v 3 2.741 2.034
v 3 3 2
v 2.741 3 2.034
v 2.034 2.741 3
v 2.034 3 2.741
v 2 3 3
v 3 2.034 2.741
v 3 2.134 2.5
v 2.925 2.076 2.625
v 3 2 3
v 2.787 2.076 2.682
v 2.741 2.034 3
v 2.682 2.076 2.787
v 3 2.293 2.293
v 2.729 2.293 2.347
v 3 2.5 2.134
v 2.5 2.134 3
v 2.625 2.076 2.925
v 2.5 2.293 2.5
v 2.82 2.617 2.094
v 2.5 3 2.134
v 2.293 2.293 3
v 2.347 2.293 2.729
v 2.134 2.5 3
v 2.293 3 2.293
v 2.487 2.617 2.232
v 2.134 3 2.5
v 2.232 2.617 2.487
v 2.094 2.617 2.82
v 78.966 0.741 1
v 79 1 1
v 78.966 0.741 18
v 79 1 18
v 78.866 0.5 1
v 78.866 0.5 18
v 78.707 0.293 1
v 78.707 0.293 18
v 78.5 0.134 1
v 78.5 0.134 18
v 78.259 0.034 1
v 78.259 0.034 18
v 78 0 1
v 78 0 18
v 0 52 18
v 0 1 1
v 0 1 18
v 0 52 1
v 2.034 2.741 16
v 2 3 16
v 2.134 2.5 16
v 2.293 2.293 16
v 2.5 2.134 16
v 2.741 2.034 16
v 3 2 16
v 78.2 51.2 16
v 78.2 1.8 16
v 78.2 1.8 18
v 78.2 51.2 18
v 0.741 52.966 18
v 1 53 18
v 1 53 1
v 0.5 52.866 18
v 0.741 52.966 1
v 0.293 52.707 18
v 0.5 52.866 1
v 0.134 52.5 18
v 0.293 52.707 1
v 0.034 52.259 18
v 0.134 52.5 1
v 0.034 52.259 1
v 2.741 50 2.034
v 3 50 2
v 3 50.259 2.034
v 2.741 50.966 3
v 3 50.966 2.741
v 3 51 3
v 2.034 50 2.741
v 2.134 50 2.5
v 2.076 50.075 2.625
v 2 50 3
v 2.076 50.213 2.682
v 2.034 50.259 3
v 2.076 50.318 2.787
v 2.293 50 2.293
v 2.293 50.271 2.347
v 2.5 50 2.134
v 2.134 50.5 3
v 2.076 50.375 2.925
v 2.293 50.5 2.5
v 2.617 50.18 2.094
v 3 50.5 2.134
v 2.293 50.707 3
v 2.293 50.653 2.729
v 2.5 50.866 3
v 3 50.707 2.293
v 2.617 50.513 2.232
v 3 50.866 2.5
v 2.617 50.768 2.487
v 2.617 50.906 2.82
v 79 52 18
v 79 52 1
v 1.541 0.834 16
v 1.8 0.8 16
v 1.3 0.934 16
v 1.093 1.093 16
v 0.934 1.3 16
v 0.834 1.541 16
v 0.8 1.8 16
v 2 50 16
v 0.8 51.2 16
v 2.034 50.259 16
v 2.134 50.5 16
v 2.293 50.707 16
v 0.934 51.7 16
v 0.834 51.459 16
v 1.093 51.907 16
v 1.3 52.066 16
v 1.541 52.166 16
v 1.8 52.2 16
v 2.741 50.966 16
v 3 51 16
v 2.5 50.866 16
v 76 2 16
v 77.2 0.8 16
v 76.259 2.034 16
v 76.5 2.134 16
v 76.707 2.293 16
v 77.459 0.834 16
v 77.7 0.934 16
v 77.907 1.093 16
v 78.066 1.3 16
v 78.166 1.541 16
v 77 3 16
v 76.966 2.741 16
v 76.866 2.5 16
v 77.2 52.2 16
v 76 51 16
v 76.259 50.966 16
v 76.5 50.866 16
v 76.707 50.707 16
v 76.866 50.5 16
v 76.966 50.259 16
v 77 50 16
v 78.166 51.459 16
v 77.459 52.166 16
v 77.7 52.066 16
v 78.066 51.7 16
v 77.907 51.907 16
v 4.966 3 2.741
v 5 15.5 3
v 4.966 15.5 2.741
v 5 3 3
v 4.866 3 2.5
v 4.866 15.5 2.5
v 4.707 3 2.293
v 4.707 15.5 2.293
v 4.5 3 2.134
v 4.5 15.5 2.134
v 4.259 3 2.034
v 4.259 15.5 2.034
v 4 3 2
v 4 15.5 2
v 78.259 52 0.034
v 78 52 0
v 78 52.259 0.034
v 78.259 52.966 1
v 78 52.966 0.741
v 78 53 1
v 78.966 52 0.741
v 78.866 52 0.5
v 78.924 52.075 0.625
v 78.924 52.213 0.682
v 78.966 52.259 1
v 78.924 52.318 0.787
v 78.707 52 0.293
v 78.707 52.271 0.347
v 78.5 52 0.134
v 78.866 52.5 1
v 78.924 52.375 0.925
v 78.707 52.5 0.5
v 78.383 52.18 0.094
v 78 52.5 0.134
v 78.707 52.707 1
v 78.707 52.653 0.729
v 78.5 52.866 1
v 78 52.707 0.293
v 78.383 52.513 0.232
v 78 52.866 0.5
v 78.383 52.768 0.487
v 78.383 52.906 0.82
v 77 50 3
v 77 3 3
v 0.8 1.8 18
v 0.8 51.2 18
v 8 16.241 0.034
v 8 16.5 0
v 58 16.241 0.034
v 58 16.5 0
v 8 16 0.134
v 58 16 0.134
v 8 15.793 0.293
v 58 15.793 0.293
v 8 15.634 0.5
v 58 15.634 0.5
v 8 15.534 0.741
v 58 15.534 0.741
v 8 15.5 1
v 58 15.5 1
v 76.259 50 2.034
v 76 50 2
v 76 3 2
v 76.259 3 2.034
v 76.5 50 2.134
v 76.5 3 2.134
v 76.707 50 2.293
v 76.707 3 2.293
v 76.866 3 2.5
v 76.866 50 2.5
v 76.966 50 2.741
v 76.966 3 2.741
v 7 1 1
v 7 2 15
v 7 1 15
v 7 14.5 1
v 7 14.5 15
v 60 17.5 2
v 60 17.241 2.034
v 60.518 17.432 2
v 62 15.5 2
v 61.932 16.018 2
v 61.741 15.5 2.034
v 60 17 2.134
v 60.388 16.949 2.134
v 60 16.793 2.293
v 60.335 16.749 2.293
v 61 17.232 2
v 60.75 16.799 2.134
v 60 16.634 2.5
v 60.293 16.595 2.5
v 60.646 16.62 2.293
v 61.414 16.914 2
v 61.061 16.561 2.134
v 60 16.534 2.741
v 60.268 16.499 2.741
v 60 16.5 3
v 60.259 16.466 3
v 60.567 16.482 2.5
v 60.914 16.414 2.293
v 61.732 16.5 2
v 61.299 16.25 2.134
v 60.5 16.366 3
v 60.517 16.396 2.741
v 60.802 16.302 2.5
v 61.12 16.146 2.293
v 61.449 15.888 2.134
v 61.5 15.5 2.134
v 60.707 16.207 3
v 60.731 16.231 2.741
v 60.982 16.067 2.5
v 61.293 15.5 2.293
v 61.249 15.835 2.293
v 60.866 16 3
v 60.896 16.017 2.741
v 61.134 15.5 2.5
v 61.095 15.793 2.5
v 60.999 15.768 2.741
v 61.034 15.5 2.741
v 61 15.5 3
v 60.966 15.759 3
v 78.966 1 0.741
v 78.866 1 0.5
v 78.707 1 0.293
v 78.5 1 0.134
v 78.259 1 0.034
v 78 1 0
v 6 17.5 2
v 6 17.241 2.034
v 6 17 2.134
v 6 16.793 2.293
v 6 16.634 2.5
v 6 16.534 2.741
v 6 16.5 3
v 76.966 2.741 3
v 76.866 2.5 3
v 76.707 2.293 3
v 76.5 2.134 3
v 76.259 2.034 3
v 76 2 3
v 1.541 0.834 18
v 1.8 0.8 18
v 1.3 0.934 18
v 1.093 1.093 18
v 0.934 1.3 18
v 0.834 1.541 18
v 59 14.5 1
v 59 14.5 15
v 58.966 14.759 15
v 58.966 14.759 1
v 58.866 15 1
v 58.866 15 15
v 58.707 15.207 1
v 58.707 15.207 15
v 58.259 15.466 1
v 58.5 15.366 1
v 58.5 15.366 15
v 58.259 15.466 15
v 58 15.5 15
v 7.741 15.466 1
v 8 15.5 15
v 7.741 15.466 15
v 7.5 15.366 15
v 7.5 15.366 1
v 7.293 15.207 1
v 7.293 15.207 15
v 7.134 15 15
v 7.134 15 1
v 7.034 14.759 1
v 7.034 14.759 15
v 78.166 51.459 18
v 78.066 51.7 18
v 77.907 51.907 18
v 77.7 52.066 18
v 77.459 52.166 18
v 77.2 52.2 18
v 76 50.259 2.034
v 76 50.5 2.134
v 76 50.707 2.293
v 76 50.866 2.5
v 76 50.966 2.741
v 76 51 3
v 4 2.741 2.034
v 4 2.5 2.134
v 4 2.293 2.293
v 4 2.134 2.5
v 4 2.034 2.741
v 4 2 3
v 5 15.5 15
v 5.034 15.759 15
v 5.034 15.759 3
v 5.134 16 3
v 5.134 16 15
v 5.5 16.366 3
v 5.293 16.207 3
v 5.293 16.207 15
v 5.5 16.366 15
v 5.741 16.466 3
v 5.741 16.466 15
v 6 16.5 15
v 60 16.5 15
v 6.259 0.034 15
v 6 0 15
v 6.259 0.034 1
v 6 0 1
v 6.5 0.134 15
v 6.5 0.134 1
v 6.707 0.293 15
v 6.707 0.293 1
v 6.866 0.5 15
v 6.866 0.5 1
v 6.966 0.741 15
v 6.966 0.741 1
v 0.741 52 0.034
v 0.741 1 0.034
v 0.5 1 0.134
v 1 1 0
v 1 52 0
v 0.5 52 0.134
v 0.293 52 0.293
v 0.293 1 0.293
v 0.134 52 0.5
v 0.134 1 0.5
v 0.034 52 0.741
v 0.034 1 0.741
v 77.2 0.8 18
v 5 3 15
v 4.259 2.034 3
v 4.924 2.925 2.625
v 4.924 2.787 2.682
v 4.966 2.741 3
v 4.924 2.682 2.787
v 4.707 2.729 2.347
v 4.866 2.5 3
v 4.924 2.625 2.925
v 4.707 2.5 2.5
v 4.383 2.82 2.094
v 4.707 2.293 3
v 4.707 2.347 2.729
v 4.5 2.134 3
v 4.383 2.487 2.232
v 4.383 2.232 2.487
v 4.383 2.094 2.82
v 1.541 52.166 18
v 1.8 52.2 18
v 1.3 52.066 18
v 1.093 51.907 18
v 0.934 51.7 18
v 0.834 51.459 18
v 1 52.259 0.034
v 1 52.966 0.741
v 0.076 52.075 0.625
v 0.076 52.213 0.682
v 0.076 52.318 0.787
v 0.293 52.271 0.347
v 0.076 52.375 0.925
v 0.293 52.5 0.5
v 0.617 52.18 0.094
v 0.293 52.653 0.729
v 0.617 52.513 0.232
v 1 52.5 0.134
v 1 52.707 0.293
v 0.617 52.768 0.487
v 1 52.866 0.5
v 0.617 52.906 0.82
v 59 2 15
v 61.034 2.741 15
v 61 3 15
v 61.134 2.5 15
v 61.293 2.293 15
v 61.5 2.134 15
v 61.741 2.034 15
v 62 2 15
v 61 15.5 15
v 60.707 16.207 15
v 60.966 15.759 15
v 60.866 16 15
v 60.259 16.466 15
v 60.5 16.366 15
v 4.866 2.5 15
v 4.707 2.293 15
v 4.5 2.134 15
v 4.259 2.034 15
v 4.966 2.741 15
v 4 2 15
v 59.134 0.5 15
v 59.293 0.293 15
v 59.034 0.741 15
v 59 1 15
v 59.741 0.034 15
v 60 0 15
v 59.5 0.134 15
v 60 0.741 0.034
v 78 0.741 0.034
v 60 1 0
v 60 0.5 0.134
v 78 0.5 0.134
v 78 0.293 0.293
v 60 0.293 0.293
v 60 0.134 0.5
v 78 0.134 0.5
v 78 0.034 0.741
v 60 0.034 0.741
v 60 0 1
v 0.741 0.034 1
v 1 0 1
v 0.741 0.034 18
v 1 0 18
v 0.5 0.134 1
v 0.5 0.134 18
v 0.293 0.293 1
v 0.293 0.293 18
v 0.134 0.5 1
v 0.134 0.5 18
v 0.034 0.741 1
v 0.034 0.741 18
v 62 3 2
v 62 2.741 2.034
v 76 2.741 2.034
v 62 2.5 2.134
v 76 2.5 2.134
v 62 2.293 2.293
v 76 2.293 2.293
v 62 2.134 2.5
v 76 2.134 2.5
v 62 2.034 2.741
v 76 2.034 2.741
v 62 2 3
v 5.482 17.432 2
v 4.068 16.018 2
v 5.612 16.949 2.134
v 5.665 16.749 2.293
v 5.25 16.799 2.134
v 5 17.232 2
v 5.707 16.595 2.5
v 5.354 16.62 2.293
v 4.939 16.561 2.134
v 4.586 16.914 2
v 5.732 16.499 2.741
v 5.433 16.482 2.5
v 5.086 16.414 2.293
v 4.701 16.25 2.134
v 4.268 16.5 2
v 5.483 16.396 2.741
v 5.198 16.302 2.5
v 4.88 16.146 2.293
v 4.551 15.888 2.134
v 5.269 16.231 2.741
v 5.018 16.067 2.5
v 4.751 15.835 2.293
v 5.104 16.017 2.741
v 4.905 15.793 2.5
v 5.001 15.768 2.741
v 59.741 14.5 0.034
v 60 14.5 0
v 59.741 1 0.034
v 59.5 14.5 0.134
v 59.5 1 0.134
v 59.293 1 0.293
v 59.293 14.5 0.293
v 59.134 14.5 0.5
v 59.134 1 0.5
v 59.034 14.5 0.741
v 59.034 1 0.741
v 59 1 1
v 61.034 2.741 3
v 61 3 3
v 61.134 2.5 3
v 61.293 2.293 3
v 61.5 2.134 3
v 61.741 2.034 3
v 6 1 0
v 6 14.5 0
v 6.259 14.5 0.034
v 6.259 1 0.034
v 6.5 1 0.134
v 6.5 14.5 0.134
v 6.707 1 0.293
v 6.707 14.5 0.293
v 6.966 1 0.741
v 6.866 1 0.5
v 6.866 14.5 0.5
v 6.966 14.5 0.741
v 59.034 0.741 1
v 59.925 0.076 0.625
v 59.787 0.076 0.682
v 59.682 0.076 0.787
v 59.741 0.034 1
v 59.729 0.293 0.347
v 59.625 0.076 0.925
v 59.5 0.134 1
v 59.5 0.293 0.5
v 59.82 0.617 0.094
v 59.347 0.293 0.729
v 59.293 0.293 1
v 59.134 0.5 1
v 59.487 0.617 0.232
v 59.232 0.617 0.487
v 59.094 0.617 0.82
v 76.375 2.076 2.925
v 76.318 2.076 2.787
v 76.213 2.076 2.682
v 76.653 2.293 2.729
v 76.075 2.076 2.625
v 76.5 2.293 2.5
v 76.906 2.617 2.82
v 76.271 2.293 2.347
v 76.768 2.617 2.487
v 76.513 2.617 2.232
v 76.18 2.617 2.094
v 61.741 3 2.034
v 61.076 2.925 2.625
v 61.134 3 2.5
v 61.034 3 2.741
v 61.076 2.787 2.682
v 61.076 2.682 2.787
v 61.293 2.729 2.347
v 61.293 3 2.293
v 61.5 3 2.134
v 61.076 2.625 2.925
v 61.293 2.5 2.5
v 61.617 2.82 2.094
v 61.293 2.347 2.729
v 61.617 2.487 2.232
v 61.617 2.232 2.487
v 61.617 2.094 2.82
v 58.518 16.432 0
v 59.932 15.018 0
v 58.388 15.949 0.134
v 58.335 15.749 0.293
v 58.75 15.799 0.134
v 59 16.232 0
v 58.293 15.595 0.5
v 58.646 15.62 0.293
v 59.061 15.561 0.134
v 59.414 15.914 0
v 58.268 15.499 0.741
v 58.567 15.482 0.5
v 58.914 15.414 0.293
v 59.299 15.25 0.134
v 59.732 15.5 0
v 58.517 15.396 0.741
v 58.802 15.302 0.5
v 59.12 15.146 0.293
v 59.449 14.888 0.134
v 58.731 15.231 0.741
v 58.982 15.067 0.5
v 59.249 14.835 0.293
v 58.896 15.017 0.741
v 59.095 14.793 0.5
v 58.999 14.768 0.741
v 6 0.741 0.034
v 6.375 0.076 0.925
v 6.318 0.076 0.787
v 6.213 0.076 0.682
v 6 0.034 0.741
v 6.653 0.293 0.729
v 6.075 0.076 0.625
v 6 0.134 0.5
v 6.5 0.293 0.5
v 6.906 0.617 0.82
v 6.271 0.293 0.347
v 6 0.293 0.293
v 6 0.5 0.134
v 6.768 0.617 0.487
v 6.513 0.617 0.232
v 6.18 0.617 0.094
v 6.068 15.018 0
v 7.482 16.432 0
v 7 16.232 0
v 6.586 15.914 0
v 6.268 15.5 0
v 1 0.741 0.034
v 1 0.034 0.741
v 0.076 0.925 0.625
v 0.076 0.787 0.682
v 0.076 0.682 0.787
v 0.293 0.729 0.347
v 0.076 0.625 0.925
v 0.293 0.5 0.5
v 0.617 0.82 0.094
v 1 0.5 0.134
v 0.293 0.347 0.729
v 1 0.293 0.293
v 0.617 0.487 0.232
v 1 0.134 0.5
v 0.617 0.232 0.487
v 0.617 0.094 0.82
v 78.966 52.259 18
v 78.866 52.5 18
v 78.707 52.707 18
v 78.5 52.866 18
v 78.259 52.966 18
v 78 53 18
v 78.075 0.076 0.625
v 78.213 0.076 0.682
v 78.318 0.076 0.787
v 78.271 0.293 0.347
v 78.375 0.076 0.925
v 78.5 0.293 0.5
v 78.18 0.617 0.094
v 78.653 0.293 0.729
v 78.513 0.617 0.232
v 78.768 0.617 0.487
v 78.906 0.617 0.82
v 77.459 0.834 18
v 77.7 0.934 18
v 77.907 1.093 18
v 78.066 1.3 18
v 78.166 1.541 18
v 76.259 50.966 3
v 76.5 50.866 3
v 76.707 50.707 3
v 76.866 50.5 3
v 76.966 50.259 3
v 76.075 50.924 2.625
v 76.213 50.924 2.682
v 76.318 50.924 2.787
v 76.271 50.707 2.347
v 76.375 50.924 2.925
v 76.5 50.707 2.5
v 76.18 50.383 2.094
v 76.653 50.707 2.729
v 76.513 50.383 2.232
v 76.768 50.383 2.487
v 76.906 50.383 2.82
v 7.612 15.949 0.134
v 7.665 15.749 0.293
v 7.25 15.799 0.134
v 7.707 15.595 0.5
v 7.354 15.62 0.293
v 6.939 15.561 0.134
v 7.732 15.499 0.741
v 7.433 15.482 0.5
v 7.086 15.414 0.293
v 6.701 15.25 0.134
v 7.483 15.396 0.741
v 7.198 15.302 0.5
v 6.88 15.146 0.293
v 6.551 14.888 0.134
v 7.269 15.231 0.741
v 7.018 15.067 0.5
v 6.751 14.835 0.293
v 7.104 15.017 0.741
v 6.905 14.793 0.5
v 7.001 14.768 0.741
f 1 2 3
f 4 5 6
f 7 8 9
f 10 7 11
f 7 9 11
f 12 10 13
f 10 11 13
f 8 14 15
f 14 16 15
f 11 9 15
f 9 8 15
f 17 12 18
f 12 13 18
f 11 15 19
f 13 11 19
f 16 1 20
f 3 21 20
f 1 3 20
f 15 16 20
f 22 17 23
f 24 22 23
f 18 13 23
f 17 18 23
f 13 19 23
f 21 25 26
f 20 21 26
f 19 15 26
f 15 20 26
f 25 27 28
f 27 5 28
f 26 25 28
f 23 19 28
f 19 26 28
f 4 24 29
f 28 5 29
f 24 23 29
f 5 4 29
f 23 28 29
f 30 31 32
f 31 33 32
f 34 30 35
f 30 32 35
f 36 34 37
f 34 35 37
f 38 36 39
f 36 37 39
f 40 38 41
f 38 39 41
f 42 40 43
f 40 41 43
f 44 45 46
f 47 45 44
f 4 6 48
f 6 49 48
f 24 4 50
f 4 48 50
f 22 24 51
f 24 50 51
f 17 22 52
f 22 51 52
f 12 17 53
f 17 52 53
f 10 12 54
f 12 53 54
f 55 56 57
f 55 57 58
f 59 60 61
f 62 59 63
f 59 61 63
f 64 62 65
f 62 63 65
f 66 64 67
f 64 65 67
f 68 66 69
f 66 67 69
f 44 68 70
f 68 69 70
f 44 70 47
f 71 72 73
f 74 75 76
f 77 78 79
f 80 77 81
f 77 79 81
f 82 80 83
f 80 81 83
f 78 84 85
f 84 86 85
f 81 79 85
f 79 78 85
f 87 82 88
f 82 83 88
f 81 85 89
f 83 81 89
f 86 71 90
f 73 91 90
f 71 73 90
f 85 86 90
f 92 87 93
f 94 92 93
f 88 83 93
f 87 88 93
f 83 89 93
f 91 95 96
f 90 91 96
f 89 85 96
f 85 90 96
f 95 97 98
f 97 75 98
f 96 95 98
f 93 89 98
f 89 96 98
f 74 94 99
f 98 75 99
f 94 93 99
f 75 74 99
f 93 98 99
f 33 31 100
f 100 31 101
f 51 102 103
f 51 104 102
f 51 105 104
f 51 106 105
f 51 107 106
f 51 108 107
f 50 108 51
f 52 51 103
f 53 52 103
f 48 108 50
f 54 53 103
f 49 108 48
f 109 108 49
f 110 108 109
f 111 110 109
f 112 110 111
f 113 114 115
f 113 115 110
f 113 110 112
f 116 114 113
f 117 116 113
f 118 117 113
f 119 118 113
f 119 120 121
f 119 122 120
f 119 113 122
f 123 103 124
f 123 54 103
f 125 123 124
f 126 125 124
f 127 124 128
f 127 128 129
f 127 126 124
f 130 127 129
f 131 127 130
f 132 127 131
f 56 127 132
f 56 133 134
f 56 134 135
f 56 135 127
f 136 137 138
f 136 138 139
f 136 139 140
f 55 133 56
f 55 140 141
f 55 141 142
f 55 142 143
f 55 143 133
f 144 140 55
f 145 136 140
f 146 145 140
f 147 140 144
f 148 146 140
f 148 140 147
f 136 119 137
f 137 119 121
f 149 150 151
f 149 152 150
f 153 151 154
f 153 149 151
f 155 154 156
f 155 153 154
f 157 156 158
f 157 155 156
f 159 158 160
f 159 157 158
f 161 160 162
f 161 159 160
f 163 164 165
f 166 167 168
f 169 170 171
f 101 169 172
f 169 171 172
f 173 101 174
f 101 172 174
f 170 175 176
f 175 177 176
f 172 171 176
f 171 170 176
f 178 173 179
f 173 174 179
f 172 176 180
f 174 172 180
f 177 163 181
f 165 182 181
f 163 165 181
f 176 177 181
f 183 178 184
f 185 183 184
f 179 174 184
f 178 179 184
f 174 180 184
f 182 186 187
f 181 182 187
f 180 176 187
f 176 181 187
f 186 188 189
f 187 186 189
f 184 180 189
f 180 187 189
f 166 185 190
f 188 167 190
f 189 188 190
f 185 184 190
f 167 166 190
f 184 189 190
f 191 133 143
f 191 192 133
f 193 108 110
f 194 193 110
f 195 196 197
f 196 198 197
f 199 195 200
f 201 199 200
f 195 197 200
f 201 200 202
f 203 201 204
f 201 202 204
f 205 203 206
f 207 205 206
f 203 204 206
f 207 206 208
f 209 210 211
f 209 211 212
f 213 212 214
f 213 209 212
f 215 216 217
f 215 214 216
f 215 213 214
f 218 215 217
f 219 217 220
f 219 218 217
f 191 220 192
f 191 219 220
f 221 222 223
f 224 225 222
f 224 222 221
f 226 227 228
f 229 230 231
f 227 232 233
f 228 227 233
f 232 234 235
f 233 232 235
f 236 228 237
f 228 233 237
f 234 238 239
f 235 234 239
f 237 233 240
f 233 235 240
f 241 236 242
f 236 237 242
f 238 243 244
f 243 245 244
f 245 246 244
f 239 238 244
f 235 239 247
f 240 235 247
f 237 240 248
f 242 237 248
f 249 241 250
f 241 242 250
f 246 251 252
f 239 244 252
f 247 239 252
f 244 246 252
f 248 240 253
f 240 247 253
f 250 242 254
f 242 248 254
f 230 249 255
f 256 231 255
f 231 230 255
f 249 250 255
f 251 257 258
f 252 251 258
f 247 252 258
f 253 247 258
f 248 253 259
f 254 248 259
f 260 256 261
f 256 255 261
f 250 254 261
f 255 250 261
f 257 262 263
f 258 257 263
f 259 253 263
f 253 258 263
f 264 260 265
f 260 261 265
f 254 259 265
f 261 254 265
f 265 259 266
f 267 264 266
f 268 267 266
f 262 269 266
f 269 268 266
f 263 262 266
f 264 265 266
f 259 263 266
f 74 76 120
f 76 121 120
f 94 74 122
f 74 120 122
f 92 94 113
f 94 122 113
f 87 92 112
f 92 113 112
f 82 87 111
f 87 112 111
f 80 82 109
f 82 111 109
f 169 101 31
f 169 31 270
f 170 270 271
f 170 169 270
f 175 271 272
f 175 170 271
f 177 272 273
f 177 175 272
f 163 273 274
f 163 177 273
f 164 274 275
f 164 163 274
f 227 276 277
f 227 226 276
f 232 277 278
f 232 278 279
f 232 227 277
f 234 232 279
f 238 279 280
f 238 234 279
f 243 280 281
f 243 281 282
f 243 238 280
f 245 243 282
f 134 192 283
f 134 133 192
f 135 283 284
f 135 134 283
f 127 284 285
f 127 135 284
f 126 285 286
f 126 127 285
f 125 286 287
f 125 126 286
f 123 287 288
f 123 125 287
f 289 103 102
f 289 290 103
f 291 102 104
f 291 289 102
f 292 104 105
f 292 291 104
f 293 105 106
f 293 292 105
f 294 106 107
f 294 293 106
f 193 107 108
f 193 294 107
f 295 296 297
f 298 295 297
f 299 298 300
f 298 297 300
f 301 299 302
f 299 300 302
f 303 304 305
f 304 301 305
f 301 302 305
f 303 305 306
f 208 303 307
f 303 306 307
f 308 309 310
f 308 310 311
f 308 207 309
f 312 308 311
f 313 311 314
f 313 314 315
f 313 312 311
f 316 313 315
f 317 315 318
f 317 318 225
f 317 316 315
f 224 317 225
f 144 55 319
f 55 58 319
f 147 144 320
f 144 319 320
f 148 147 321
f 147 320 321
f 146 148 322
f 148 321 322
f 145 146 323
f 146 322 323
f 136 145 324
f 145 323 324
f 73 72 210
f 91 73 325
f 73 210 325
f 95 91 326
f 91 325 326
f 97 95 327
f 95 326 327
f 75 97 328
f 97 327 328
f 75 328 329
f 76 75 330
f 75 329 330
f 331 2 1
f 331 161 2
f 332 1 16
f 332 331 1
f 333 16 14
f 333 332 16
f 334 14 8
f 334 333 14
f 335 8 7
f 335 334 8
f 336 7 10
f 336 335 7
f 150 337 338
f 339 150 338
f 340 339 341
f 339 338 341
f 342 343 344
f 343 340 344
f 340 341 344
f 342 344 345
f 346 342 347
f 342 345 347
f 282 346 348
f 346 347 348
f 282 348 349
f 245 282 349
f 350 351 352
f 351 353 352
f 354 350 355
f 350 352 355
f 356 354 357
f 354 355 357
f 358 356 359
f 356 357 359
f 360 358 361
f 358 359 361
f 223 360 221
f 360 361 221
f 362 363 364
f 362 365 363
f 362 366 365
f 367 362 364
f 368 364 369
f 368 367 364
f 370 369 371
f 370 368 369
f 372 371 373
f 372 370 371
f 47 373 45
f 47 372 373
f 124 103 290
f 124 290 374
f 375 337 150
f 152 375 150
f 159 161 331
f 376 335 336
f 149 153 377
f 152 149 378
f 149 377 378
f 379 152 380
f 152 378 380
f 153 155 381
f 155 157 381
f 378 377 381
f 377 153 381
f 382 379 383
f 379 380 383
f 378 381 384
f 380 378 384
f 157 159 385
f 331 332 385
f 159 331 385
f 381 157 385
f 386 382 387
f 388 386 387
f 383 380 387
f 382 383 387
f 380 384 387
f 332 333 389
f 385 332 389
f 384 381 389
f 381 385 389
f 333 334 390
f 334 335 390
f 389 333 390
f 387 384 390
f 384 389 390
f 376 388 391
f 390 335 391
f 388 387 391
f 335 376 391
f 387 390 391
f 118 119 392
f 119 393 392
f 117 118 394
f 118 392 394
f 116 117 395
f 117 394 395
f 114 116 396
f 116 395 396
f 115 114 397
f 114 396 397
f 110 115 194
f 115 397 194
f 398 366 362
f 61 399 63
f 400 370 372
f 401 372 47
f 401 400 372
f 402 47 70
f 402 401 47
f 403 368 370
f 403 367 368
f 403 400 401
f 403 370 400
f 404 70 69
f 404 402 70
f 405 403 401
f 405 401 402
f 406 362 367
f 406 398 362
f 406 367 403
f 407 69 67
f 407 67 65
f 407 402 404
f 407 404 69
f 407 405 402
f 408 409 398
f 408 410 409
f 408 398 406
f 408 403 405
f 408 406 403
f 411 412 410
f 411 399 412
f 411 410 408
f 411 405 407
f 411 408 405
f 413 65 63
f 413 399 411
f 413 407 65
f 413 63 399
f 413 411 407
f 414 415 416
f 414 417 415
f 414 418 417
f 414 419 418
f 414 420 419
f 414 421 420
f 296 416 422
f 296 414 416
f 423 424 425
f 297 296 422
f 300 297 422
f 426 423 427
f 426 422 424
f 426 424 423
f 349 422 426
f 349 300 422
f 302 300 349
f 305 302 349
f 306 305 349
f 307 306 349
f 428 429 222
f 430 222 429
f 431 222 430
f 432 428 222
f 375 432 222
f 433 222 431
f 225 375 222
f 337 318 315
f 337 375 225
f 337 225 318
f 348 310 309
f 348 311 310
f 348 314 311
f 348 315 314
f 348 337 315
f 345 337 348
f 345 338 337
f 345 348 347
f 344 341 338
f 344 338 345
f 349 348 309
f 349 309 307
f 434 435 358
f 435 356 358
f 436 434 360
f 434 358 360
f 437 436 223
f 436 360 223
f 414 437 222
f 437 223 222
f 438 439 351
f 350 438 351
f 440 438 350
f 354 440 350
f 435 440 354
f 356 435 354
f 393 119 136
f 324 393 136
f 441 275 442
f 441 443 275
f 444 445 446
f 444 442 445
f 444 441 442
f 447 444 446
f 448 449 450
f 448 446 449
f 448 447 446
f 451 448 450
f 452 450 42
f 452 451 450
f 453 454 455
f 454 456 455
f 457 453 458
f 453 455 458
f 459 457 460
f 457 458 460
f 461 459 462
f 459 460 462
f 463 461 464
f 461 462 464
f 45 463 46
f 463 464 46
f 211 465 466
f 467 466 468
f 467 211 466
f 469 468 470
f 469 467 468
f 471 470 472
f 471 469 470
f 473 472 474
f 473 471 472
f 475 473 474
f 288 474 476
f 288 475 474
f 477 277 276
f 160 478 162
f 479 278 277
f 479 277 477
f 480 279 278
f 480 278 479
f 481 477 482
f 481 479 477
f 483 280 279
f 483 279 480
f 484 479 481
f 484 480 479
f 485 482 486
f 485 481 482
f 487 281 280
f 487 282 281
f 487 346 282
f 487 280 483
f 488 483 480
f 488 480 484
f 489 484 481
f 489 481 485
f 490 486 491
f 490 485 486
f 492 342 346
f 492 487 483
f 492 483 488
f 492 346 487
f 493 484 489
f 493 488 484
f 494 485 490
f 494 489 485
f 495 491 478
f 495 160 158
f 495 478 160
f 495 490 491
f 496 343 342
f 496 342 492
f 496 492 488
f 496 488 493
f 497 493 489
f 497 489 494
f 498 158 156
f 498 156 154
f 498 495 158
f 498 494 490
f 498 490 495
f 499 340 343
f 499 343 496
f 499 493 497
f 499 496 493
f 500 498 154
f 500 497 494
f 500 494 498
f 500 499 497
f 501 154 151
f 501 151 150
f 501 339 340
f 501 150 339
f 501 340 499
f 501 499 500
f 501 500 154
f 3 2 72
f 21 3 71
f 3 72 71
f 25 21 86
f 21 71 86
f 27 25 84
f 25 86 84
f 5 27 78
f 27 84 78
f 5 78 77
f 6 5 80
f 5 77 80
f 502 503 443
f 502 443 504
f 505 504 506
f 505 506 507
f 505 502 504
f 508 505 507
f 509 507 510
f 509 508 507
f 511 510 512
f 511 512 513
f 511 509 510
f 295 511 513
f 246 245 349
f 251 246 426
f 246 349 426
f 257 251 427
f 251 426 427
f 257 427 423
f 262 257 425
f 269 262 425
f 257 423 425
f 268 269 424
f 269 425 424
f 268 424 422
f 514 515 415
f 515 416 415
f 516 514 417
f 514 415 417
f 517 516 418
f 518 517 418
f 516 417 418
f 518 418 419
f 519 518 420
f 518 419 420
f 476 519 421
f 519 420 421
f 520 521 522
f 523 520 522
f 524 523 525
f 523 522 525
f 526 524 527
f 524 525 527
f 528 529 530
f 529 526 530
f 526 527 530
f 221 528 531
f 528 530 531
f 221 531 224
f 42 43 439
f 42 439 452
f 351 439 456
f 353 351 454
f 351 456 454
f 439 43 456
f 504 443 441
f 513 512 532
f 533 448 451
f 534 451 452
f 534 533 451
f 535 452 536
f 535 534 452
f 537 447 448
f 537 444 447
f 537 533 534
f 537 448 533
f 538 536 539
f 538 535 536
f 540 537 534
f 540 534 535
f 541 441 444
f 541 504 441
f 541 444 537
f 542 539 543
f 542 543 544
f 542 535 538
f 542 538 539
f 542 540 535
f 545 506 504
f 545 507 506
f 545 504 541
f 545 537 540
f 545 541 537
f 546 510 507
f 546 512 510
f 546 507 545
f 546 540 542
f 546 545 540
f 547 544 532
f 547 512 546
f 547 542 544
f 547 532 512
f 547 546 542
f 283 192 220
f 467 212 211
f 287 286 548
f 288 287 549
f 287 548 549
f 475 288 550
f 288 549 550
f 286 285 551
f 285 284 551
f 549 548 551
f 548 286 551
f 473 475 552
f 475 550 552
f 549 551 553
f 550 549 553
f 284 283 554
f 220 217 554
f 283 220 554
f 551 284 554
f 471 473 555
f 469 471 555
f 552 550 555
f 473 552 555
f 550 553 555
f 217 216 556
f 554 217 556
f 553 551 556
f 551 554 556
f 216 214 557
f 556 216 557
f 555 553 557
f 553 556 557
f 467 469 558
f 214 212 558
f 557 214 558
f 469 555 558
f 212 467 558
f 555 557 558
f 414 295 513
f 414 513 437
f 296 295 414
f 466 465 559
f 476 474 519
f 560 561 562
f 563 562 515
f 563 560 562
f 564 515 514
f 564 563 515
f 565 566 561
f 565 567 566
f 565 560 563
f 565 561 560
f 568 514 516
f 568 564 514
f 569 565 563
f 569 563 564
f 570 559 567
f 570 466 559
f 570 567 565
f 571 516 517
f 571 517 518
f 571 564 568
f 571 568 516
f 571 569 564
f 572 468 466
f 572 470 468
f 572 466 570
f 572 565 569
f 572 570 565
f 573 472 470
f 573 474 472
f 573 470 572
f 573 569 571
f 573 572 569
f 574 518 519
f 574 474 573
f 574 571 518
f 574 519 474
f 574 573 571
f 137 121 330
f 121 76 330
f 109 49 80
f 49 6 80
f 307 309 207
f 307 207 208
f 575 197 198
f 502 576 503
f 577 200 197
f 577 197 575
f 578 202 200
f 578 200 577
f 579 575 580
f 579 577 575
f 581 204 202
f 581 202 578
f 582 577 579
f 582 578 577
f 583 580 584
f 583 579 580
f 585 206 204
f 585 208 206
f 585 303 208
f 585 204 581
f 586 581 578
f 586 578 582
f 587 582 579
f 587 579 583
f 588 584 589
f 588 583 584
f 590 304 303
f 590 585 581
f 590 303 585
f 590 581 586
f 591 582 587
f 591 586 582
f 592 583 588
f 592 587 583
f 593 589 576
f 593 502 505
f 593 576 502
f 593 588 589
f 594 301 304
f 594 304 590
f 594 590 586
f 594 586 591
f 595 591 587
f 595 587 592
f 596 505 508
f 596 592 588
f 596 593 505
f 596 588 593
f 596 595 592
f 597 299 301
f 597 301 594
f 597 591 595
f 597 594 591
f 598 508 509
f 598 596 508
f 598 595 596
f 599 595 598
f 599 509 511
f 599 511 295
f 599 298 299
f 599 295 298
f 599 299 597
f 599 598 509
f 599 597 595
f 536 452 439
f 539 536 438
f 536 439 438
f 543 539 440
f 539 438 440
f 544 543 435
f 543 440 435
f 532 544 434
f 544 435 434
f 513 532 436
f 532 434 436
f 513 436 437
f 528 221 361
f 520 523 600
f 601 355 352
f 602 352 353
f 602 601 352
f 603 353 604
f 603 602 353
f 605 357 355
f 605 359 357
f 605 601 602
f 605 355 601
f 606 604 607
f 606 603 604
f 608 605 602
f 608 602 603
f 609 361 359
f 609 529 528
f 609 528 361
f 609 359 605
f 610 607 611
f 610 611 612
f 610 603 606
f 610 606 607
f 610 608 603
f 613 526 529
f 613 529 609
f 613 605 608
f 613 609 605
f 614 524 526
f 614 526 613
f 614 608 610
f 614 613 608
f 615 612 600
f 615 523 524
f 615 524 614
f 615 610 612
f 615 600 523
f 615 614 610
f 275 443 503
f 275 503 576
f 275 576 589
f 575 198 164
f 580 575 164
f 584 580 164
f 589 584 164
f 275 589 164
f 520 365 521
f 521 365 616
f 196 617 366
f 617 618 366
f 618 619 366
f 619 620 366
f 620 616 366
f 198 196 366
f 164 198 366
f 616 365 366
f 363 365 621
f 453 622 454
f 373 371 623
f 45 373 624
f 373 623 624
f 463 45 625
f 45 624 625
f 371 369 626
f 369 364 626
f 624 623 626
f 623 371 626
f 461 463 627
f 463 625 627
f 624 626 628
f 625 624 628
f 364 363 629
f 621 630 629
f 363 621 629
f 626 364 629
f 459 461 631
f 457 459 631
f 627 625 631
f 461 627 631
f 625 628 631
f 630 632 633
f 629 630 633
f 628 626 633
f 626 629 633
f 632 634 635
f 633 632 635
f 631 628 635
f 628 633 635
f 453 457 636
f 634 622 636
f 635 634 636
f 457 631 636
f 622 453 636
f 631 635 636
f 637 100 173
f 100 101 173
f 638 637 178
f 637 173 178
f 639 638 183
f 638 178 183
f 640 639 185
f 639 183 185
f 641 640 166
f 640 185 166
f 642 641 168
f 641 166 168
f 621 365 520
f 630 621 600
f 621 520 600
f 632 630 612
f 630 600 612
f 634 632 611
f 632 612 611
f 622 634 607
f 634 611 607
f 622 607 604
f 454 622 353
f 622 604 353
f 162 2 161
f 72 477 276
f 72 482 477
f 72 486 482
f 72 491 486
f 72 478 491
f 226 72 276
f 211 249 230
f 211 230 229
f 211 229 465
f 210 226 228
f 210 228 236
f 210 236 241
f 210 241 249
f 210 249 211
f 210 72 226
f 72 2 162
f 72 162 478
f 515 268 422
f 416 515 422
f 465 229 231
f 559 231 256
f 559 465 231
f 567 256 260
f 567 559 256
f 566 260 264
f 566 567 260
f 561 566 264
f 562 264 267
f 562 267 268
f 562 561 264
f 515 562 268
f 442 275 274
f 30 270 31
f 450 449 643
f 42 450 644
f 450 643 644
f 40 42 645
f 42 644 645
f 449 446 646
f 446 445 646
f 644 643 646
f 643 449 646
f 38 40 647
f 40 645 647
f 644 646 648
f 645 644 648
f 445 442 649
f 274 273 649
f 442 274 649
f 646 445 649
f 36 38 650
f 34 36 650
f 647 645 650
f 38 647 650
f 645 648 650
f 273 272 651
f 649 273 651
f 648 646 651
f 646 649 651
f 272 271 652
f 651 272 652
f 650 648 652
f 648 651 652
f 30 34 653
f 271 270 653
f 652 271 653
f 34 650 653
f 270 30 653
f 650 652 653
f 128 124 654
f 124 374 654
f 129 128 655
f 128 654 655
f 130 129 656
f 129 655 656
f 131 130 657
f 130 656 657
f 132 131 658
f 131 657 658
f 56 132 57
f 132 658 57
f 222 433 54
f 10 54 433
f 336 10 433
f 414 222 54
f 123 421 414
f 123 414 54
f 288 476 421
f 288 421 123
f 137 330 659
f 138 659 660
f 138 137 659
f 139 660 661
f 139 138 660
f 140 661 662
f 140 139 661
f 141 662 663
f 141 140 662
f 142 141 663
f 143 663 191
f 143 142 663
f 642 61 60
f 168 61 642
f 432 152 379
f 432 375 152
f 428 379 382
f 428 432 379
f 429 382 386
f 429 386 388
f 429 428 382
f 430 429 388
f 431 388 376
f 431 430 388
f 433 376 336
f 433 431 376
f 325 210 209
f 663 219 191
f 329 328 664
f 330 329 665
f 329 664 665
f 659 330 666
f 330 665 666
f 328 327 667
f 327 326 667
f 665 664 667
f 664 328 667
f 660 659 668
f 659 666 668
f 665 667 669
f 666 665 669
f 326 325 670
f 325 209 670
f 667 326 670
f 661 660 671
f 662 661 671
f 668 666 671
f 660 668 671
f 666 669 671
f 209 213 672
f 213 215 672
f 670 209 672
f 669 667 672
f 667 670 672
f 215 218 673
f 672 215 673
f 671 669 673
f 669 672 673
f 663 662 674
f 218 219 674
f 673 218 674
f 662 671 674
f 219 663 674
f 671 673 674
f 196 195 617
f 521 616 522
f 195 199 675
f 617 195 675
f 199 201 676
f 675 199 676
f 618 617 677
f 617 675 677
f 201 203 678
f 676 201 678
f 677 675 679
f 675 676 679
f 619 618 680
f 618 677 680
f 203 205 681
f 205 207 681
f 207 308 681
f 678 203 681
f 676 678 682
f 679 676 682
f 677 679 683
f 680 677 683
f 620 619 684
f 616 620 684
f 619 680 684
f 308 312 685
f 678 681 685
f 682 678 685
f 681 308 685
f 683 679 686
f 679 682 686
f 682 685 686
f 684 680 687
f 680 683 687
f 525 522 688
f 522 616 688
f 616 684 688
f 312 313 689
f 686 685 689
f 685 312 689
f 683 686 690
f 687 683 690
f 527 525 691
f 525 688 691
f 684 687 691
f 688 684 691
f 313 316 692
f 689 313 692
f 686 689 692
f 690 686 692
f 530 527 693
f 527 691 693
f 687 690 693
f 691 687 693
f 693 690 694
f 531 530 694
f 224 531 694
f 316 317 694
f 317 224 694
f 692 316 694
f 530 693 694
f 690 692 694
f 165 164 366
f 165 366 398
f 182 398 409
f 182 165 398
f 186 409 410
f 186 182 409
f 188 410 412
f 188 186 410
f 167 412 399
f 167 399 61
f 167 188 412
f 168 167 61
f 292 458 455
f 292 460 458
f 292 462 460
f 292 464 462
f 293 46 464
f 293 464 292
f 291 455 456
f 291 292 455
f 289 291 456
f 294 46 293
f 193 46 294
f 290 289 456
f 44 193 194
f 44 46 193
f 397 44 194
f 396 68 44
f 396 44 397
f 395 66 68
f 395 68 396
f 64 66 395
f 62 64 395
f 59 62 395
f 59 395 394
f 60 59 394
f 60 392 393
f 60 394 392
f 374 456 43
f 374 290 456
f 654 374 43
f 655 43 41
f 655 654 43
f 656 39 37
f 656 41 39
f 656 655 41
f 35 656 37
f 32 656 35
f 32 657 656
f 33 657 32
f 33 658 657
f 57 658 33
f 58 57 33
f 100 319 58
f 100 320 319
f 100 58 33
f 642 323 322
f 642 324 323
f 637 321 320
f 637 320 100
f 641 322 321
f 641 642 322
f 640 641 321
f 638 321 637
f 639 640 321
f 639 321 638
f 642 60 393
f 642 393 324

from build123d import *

# Parameters (mm, degrees)
SKETCH1_W           = 79
SKETCH1_H           = 53
BOSS_EXTRUDE1_DEPTH = 2
SKETCH2_W           = 79
SKETCH2_H           = 53
SKETCH2_W_2         = 75
SKETCH2_H_2         = 49
BOSS_EXTRUDE2_DEPTH = 14
SKETCH3_W           = 79
SKETCH3_H           = 53
SKETCH3_W_2         = 77.4
SKETCH3_H_2         = 51.4
BOSS_EXTRUDE3_DEPTH = 2
SKETCH5_W           = 15
SKETCH5_H           = 16.5
CUT_EXTRUDE2_DEPTH  = 54
SKETCH6_W           = 15
SKETCH6_H           = 16.5
BOSS_EXTRUDE4_DEPTH = 2
SKETCH7_W           = 54
SKETCH7_H           = 15
BOSS_EXTRUDE6_DEPTH = 1
SKETCH8_W           = 15
SKETCH8_H           = 15.5
BOSS_EXTRUDE8_DEPTH = 2
FILLET1_R           = 1


with BuildPart() as part:
    # Sketch1 → Boss-Extrude1 (new body)
    with BuildSketch(Plane.XY):
        with Locations((39.5, 26.5)):
            Rectangle(SKETCH1_W, SKETCH1_H)
    extrude(amount=BOSS_EXTRUDE1_DEPTH)

    # Sketch2 → Boss-Extrude2 (add)
    with BuildSketch(Plane.XY.offset(2)):
        with Locations((39.5, 26.5)):
            Rectangle(SKETCH2_W, SKETCH2_H)
        with Locations((39.5, 26.5)):
            Rectangle(SKETCH2_W_2, SKETCH2_H_2, mode=Mode.SUBTRACT)
    extrude(amount=BOSS_EXTRUDE2_DEPTH)

    # Sketch3 → Boss-Extrude3 (add)
    with BuildSketch(Plane.XY.offset(16)):
        with Locations((39.5, 26.5)):
            Rectangle(SKETCH3_W, SKETCH3_H)
        with Locations((39.5, 26.5)):
            Rectangle(SKETCH3_W_2, SKETCH3_H_2, mode=Mode.SUBTRACT)
    extrude(amount=BOSS_EXTRUDE3_DEPTH)

    # Sketch5 → Cut-Extrude2 (cut)
    with BuildSketch(Plane.ZY.offset(-5)):
        with Locations((7.5, 8.25)):
            Rectangle(SKETCH5_W, SKETCH5_H)
    extrude(amount=-CUT_EXTRUDE2_DEPTH, mode=Mode.SUBTRACT)

    # Sketch6 → Boss-Extrude4 (add)
    with BuildSketch(Plane.ZY.offset(-59)):
        with Locations((7.5, 8.25)):
            Rectangle(SKETCH6_W, SKETCH6_H)
    extrude(amount=-BOSS_EXTRUDE4_DEPTH)

    # Sketch7 → Boss-Extrude6 (add)
    with BuildSketch(Plane.XZ.offset(-16.5)):
        with Locations((32, 7.5)):
            Rectangle(SKETCH7_W, SKETCH7_H)
    extrude(amount=BOSS_EXTRUDE6_DEPTH)

    # Sketch8 → Boss-Extrude8 (add)
    with BuildSketch(Plane(origin=(5, 0, 0), x_dir=(0, 0, -1), z_dir=(1, 0, 0))):
        with Locations((-7.5, 7.75)):
            Rectangle(SKETCH8_W, SKETCH8_H)
    extrude(amount=BOSS_EXTRUDE8_DEPTH)

    # Fillet1
    fillet1_edges = [part.edges().sort_by_distance(p)[0] for p in [
        (59, 7.75, 0),
        (5, 16.5, 8.5),
        (59, 15.5, 7.5),
        (33, 15.5, 0),
        (7, 7.75, 0),
        (7, 15.5, 7.5),
        (7, 0, 7.5),
        (77, 26.5, 2),
        (39.5, 51, 2),
        (2, 26.5, 2),
        (3.5, 2, 2),
        (77, 51, 9),
        (2, 51, 9),
        (2, 2, 9),
        (77, 2, 9),
        (78.2, 52.2, 17),
        (0.8, 52.2, 17),
        (0.8, 0.8, 17),
        (78.2, 0.8, 17),
        (39.5, 53, 0),
        (79, 26.5, 0),
        (3.5, 0, 0),
        (0, 26.5, 0),
        (69, 0, 0),
        (33, 16.5, 2),
        (5, 9.25, 2),
        (59, 0, 7.5),
        (5, 2, 8.5),
        (0, 53, 9),
        (79, 53, 9),
        (79, 0, 9),
        (0, 0, 9),
        (69, 2, 2),
        (61, 9.25, 2),
        (61, 16.5, 8.5),
        (61, 2, 8.5),
    ]]
    fillet(fillet1_edges, radius=FILLET1_R)


solid = part.part
